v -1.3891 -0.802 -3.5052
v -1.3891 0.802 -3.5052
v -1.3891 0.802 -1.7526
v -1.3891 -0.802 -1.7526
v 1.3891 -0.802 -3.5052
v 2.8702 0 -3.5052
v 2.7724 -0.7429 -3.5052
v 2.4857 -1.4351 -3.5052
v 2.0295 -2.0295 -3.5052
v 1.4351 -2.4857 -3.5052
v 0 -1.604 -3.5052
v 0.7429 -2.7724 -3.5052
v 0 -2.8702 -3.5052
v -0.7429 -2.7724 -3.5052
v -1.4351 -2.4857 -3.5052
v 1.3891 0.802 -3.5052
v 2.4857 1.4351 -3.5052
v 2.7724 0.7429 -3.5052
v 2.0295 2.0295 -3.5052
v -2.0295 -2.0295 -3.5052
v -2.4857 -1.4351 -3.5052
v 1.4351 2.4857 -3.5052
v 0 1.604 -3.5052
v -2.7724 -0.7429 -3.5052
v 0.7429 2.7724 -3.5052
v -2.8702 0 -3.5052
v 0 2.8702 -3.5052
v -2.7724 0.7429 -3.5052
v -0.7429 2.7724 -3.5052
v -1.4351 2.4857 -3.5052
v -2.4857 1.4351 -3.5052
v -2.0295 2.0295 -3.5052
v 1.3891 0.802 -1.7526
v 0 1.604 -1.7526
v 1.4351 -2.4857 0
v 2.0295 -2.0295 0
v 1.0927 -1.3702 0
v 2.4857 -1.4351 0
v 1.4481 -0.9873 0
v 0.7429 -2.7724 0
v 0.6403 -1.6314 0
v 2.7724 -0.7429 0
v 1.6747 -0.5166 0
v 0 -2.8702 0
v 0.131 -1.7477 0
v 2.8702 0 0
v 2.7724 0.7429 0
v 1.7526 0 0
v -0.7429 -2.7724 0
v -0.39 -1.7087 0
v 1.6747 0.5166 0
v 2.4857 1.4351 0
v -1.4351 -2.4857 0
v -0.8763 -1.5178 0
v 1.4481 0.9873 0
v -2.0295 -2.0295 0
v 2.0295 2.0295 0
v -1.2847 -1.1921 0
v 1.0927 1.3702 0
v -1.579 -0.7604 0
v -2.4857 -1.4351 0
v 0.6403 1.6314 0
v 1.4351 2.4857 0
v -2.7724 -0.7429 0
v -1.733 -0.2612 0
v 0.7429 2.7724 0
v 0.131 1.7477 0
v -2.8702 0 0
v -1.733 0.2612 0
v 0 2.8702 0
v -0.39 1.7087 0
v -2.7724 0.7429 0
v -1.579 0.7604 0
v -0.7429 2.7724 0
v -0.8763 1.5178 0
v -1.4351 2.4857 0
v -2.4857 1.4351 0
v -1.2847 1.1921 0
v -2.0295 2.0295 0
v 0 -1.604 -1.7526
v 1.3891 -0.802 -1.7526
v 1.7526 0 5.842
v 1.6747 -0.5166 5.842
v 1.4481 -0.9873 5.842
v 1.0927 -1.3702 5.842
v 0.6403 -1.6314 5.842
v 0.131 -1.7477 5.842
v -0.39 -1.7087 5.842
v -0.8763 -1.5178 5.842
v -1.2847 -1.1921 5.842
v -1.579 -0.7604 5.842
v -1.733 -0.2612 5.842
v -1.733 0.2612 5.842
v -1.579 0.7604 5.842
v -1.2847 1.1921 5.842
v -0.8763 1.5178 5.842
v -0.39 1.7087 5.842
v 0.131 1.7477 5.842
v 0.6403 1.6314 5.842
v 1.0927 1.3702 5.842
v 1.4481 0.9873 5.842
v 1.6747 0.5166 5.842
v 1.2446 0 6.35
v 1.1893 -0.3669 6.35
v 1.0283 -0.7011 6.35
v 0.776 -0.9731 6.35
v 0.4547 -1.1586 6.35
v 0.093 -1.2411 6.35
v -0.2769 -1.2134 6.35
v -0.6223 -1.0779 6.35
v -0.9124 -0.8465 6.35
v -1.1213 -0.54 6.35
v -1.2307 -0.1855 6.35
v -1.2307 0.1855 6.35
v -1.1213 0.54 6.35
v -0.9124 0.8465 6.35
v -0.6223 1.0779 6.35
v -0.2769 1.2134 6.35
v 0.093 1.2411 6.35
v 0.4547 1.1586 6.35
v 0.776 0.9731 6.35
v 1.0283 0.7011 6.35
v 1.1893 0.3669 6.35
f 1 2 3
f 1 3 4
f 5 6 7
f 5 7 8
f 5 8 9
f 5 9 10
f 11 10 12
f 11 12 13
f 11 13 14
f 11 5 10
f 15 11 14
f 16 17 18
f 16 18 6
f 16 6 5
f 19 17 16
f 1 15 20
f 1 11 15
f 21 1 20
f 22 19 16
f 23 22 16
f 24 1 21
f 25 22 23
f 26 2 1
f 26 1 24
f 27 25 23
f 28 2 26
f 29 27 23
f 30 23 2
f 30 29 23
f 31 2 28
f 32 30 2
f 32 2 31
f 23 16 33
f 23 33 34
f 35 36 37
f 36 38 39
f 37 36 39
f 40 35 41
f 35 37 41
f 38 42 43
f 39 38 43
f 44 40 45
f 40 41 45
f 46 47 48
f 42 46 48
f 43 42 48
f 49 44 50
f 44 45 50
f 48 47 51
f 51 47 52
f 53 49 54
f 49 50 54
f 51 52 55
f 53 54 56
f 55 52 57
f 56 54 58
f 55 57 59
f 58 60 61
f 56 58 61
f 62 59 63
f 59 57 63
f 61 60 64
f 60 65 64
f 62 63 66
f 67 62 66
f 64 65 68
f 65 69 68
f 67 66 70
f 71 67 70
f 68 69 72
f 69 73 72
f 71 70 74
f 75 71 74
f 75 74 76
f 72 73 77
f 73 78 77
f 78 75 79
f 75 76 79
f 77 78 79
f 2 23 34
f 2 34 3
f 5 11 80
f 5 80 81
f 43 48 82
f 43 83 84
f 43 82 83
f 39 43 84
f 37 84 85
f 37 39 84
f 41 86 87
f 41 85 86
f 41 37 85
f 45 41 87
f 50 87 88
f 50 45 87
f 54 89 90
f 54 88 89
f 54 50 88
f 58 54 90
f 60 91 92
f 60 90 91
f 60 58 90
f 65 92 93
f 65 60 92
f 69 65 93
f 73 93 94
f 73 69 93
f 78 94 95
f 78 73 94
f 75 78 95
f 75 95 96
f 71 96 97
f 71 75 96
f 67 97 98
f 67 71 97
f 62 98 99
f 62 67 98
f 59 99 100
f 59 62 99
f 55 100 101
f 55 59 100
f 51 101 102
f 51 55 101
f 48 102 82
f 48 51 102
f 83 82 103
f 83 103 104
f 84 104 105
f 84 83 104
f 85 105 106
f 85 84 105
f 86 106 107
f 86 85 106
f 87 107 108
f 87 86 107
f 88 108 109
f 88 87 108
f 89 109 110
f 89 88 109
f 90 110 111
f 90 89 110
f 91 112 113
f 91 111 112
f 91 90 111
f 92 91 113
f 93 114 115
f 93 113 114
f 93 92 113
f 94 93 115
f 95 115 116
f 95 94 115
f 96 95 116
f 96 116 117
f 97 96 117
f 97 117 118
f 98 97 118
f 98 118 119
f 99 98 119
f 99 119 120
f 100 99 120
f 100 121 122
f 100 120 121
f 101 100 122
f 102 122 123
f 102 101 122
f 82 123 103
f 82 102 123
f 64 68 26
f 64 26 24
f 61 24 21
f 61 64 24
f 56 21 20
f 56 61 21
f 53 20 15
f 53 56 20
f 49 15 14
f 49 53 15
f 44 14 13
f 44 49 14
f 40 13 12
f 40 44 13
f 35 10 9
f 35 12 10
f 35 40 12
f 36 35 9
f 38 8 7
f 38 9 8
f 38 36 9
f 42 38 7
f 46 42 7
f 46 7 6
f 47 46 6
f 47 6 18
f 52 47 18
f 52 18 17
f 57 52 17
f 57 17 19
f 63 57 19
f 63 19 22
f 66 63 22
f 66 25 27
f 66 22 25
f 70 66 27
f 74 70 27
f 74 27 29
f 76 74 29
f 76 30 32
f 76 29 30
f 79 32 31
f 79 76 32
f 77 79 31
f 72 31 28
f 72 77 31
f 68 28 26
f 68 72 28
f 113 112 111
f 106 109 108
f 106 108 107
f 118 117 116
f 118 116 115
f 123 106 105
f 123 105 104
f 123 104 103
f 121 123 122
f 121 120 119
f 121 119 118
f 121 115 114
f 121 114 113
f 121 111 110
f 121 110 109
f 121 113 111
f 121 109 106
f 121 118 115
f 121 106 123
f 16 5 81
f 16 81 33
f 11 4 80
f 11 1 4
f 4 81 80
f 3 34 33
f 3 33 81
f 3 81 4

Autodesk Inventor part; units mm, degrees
ref_plane "YZ Plane" through (0, 0, 0) normal (1, 0, 0) x (0, 1, 0)
ref_plane "XZ Plane" through (0, 0, 0) normal (0, 1, 0) x (-1, 0, 0)
ref_plane "XY Plane" through (0, 0, 0) normal (0, 0, 1) x (1, 0, 0)
sketch "Sketch1" plane through (0, 0, 0) normal (0, 0, 1) x (1, 0, 0)
  circle A0 centre (0, 0) radius 1.7526
  dimension "d0" = 3.5052
extrude "Extrusion1" add sketch "Sketch1" along normal blind 6.35
sketch "Sketch2" plane through (0, 0, 0) normal (0, 0, -1) x (-1, 0, 0)
  circle A0 centre (0, 0) radius 1.7526 construction
  circle A1 centre (0, 0) radius 2.8702
  dimension "d3" = 5.7404
extrude "Extrusion2" add sketch "Sketch2" along normal blind 3.5052
sketch "Sketch3" plane through (0, 0, -3.5052) normal (0, 0, -1) x (-1, 0, 0)
  circle A0 centre (0, 0) radius 2.8702 projected
  line L0 (0, 1.604) -> (1.3891, 0.802)
  line L1 (1.3891, 0.802) -> (1.3891, -0.802)
  line L2 (1.3891, -0.802) -> (0, -1.604)
  line L3 (0, -1.604) -> (-1.3891, -0.802)
  line L4 (-1.3891, -0.802) -> (-1.3891, 0.802)
  line L5 (-1.3891, 0.802) -> (0, 1.604)
  dimension "d6" = 2.7781
extrude "Extrusion3" cut sketch "Sketch3" against normal blind 1.7526 contours L0 L1 L2 L3 L4 L5
thread "Thread1" size "6-32 UNC" class "2A" standard "ANSI Unified Screw Threads" full length
chamfer "Chamfer1" distance 0.508 angle 45 1 edges at (-1.7526, 0, 6.35)
properties part number "6-32 SHCS x500" material "Stainless Steel"
